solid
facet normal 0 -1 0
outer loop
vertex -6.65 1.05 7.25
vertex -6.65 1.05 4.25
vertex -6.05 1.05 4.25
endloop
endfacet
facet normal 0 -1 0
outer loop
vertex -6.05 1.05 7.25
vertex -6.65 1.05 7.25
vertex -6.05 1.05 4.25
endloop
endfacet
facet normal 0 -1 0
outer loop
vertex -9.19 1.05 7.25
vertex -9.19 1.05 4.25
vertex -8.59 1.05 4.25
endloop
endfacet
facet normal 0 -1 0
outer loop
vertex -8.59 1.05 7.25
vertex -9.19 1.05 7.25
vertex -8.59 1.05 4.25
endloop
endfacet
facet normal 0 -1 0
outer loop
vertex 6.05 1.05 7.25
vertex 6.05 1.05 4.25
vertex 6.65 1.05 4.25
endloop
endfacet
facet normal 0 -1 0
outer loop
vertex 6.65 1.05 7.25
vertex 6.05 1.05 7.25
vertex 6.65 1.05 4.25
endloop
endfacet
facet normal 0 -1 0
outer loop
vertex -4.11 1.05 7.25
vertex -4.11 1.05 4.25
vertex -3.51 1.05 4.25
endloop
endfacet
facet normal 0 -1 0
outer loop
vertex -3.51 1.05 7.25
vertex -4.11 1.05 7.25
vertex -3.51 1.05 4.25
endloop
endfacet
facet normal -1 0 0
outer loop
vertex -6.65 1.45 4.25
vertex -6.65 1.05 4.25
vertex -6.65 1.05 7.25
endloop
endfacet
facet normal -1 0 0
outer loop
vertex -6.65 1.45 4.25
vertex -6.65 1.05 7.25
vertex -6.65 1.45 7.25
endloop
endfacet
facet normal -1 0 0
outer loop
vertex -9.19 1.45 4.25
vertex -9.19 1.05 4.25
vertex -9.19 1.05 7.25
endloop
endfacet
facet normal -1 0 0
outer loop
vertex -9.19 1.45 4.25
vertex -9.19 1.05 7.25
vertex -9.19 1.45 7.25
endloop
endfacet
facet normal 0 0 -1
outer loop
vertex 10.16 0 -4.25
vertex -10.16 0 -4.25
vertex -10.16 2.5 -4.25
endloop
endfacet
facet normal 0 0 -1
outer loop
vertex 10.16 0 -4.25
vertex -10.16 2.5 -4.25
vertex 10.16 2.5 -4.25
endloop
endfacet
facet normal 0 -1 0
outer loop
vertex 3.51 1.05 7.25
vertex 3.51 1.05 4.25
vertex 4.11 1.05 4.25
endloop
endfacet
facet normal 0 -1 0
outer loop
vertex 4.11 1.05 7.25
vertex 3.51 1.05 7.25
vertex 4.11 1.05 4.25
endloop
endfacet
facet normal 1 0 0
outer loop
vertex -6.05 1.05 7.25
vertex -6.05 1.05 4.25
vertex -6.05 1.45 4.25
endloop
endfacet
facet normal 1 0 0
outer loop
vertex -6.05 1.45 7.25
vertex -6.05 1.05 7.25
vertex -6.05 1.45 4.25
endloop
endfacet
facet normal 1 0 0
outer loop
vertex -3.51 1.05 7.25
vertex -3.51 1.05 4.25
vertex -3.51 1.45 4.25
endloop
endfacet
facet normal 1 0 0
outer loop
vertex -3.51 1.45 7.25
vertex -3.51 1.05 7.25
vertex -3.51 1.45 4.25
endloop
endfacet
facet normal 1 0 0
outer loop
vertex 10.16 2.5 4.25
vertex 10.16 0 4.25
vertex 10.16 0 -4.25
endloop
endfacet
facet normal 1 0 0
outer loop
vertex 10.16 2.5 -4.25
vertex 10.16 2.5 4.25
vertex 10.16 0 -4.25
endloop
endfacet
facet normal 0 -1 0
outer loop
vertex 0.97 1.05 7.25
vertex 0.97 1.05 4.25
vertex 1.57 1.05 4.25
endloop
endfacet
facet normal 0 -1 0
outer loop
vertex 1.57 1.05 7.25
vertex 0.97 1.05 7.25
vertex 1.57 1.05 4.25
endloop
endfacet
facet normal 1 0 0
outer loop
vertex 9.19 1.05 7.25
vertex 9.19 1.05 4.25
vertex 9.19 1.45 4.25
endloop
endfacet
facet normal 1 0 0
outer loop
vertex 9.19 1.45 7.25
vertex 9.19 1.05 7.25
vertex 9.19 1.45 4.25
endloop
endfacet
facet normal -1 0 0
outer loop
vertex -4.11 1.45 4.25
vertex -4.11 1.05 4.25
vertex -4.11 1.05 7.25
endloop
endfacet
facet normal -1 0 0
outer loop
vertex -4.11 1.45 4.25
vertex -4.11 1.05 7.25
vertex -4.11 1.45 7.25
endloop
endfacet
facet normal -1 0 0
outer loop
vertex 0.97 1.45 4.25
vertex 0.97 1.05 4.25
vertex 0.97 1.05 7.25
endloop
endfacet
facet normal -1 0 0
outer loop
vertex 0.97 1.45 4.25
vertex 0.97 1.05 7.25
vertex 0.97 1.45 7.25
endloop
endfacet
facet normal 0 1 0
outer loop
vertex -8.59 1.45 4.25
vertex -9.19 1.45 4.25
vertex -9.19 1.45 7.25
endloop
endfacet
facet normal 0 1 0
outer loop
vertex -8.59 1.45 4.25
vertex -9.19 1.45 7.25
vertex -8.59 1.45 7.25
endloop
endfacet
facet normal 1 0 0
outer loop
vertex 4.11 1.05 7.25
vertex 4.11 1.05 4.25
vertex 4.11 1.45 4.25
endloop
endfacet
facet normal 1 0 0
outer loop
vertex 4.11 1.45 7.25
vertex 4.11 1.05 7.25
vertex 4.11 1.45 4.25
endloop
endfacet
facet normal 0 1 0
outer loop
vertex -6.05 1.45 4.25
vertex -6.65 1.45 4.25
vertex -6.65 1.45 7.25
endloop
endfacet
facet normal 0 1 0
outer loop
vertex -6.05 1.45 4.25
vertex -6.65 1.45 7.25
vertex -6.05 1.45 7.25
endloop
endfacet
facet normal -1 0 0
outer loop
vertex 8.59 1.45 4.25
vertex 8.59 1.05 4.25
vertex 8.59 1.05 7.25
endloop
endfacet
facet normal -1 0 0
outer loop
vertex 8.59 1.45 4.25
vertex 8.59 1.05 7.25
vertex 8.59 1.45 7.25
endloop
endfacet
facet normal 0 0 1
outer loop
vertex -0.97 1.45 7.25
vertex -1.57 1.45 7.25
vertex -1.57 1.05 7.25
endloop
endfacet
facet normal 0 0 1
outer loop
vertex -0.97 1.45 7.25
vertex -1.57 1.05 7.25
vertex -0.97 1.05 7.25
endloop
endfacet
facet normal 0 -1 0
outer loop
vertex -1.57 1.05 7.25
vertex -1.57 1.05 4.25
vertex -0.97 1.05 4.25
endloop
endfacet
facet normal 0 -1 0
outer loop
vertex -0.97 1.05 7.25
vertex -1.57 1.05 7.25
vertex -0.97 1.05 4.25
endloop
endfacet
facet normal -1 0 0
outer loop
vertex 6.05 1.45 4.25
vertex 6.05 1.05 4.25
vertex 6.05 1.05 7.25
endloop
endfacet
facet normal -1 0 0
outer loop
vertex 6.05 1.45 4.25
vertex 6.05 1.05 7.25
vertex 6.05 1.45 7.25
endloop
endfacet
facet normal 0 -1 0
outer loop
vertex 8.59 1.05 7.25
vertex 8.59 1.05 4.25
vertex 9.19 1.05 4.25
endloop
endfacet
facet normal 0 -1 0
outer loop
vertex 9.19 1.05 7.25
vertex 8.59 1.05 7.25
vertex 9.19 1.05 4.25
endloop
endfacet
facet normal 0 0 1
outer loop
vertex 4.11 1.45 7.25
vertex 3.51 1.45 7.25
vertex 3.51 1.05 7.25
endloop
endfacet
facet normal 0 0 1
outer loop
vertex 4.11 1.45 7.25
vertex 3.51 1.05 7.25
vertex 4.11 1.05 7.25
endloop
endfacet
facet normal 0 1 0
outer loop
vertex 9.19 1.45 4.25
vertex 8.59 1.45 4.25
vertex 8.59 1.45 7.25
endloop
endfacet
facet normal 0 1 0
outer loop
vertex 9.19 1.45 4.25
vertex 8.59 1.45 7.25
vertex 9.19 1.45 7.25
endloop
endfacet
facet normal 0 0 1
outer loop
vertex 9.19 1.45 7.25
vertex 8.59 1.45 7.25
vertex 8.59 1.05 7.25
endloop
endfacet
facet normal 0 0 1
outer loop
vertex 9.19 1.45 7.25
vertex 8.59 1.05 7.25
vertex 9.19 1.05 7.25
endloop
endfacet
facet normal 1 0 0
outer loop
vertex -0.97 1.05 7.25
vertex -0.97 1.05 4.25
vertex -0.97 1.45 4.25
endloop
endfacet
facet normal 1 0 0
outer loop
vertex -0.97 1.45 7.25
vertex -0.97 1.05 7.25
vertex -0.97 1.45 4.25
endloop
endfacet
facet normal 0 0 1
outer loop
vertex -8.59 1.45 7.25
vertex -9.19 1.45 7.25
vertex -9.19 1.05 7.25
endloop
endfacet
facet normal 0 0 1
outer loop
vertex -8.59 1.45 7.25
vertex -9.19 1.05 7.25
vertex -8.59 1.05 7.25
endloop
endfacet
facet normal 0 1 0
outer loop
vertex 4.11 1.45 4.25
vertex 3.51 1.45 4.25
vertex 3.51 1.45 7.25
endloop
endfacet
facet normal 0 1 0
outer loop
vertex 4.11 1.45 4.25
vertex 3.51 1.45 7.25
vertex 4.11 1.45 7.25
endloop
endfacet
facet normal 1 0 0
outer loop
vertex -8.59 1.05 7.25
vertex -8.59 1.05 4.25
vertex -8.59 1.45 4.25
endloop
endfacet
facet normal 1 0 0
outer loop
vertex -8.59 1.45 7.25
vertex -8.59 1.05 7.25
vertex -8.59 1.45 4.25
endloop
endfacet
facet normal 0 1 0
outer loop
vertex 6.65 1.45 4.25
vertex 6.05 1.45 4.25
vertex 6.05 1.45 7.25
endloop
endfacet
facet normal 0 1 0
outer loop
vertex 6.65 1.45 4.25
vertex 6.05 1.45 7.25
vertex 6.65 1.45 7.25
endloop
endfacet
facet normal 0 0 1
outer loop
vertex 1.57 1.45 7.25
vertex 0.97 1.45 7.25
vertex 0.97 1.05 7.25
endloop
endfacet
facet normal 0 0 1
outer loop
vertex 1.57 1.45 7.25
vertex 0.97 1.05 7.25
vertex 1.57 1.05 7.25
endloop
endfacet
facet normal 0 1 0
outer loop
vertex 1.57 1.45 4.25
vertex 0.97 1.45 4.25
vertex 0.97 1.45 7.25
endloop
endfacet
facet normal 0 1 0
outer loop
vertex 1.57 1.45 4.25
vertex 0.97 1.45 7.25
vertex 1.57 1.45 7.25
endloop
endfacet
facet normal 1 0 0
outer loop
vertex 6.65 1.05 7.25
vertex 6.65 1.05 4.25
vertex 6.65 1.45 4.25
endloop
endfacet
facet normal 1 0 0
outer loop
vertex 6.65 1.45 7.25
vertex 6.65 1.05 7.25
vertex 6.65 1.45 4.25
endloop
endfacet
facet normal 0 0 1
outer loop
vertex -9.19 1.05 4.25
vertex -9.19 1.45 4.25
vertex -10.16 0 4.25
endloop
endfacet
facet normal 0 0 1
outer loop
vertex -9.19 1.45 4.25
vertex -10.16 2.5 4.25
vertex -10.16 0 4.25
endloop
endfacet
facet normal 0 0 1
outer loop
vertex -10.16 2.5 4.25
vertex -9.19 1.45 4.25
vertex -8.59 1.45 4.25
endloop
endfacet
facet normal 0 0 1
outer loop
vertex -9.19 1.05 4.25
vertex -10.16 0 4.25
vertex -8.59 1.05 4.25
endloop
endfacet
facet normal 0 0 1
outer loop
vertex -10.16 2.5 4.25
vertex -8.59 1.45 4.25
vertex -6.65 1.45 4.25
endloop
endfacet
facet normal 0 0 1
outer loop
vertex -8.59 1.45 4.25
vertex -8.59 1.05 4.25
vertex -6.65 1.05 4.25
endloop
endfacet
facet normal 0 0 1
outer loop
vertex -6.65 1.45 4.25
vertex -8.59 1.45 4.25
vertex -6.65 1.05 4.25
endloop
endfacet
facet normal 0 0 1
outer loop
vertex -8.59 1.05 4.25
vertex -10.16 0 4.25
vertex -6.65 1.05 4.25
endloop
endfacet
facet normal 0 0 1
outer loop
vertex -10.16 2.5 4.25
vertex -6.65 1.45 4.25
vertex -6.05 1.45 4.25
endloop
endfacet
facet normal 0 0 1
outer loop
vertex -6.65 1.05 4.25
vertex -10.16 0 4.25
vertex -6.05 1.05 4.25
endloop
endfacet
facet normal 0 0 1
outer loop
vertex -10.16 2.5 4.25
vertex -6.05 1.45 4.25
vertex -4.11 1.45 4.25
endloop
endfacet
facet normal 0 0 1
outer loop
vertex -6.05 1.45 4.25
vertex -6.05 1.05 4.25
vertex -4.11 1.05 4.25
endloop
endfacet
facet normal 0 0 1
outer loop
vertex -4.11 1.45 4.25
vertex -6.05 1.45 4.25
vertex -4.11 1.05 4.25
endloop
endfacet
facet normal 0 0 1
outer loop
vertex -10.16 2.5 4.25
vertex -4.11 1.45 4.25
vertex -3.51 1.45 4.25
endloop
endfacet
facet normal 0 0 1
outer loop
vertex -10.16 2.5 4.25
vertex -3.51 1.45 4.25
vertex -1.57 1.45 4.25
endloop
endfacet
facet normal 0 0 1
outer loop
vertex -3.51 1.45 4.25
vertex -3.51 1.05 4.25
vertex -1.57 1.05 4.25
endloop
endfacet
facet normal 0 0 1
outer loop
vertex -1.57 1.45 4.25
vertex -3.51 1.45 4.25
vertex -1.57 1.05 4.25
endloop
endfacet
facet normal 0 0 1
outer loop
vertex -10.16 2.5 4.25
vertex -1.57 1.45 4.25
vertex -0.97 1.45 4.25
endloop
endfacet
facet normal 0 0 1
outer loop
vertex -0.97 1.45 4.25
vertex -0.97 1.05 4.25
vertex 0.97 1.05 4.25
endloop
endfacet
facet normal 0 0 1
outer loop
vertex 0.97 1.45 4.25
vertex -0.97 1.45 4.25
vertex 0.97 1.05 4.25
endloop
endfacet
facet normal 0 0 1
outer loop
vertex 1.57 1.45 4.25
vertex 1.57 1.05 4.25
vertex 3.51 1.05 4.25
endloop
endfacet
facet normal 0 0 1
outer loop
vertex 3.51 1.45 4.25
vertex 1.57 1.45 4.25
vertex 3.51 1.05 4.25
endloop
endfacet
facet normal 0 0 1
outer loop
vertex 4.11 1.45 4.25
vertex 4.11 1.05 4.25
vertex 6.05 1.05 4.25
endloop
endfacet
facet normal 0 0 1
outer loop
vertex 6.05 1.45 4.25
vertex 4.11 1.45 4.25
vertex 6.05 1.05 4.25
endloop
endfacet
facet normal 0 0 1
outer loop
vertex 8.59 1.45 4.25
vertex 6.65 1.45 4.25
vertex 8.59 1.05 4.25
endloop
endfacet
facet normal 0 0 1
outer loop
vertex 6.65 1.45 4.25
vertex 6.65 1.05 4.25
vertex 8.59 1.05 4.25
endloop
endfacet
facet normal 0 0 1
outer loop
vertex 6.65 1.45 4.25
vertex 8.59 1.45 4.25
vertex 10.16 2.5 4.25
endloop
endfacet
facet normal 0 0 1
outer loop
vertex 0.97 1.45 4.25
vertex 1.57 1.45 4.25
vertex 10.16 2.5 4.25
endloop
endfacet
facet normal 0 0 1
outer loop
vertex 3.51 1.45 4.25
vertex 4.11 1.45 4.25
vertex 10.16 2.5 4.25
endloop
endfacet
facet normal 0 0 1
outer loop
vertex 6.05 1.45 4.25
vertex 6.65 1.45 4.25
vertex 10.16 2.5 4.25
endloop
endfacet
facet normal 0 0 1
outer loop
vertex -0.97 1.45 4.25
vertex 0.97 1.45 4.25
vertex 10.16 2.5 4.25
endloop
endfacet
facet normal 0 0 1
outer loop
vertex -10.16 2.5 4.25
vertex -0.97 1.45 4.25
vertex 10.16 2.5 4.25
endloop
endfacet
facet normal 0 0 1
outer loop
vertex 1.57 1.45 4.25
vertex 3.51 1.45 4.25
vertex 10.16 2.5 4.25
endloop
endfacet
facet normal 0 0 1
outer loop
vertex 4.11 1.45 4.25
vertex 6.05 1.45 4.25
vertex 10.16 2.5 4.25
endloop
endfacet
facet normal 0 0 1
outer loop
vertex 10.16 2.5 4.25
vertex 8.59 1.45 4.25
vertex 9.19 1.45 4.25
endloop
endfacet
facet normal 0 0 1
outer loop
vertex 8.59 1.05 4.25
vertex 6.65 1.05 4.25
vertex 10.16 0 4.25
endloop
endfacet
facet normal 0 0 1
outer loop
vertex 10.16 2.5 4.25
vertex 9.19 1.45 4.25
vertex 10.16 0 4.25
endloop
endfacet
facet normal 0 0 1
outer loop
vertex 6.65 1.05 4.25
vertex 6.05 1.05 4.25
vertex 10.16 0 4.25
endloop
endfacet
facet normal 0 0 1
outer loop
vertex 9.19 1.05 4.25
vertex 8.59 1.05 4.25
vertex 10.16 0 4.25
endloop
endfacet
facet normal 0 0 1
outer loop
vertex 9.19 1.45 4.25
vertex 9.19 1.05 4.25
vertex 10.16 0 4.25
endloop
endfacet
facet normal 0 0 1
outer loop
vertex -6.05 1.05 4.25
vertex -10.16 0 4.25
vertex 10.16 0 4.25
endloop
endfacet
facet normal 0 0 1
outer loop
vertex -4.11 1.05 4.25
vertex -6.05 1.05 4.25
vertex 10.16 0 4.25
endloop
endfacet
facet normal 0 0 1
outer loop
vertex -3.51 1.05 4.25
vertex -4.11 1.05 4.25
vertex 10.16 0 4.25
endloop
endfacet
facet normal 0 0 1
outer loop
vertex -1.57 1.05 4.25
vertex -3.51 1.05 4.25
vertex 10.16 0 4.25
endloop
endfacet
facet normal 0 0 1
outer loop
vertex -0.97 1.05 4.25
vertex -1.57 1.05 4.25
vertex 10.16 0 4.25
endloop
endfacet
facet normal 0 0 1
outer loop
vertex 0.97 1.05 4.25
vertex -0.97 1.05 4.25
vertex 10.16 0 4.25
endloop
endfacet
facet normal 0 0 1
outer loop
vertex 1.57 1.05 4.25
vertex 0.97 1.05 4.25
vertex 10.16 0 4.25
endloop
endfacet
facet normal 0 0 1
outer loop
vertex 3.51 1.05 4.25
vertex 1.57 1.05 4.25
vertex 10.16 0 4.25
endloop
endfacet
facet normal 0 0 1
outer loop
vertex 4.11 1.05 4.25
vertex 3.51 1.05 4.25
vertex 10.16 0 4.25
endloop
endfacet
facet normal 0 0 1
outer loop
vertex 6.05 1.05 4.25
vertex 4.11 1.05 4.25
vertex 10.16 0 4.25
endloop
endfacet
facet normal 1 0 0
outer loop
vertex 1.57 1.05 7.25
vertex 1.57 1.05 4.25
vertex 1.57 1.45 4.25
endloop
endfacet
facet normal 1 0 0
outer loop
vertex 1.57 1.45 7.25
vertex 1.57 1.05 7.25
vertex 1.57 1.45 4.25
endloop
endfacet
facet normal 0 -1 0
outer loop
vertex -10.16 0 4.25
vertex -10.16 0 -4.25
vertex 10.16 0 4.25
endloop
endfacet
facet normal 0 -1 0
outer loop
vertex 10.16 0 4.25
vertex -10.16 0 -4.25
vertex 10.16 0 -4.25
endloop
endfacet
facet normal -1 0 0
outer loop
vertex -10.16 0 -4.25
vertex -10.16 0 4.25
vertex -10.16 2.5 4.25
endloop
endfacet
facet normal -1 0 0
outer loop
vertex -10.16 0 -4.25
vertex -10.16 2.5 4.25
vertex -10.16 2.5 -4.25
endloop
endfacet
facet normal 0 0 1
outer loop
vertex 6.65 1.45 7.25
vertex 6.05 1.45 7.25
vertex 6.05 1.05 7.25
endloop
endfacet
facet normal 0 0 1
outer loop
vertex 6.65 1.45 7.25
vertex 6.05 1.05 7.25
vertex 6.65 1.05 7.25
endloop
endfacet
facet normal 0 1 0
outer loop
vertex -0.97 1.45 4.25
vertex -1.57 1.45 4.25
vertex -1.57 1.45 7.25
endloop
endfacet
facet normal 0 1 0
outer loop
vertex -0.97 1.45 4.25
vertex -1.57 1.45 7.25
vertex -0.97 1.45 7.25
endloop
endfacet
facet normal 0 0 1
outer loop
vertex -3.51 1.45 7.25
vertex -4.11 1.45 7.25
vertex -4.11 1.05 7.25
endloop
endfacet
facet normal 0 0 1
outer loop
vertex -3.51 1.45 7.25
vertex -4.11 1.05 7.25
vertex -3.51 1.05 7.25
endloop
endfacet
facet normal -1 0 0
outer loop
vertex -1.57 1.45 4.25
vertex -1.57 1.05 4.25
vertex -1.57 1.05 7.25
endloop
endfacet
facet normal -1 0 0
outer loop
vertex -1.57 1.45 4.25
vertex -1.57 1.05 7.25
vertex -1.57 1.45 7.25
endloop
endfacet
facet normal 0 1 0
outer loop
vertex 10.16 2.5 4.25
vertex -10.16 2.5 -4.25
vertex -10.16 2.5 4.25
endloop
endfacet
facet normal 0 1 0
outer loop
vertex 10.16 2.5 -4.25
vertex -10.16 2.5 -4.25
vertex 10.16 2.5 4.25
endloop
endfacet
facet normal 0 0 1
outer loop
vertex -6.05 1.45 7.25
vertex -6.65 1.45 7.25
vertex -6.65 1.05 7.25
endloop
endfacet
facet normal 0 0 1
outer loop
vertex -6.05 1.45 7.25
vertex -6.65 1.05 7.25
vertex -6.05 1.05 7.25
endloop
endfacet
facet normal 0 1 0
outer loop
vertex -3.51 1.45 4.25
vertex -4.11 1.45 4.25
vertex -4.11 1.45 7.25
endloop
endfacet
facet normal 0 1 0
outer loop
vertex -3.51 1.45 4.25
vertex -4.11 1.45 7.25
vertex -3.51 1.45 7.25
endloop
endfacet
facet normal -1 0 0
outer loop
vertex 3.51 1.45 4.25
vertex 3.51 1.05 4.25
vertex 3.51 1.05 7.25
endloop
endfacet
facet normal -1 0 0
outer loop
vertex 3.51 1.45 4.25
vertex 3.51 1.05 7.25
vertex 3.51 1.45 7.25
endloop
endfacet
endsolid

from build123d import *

# Parameters (mm, degrees)
SKETCH_1_W      = 20.32
SKETCH_1_H      = 8.5
EXTRUDE_1_DEPTH = 2.5
SKETCH_2_W      = 0.6
SKETCH_2_H      = 0.4
EXTRUDE_2_DEPTH = 3


with BuildPart() as part:
    # Эскиз1 → Бобышка-Вытянуть1 (new body)
    with BuildSketch(Plane(origin=(0, 0, 0), x_dir=(1, 0, 0), z_dir=(0, 1, 0))):
        Rectangle(SKETCH_1_W, SKETCH_1_H)
    extrude(amount=EXTRUDE_1_DEPTH)

    # Эскиз2 → Бобышка-Вытянуть2 (add)
    with BuildSketch(Plane.XY.offset(4.25)):
        with Locations((-6.35, 1.25)):
            Rectangle(SKETCH_2_W, SKETCH_2_H)
        with Locations((-8.89, 1.25)):
            Rectangle(SKETCH_2_W, SKETCH_2_H)
        with Locations((-3.81, 1.25)):
            Rectangle(SKETCH_2_W, SKETCH_2_H)
        with Locations((-1.27, 1.25)):
            Rectangle(SKETCH_2_W, SKETCH_2_H)
        with Locations((1.27, 1.25)):
            Rectangle(SKETCH_2_W, SKETCH_2_H)
        with Locations((3.81, 1.25)):
            Rectangle(SKETCH_2_W, SKETCH_2_H)
        with Locations((6.35, 1.25)):
            Rectangle(SKETCH_2_W, SKETCH_2_H)
        with Locations((8.89, 1.25)):
            Rectangle(SKETCH_2_W, SKETCH_2_H)
    extrude(amount=EXTRUDE_2_DEPTH)


solid = part.part
